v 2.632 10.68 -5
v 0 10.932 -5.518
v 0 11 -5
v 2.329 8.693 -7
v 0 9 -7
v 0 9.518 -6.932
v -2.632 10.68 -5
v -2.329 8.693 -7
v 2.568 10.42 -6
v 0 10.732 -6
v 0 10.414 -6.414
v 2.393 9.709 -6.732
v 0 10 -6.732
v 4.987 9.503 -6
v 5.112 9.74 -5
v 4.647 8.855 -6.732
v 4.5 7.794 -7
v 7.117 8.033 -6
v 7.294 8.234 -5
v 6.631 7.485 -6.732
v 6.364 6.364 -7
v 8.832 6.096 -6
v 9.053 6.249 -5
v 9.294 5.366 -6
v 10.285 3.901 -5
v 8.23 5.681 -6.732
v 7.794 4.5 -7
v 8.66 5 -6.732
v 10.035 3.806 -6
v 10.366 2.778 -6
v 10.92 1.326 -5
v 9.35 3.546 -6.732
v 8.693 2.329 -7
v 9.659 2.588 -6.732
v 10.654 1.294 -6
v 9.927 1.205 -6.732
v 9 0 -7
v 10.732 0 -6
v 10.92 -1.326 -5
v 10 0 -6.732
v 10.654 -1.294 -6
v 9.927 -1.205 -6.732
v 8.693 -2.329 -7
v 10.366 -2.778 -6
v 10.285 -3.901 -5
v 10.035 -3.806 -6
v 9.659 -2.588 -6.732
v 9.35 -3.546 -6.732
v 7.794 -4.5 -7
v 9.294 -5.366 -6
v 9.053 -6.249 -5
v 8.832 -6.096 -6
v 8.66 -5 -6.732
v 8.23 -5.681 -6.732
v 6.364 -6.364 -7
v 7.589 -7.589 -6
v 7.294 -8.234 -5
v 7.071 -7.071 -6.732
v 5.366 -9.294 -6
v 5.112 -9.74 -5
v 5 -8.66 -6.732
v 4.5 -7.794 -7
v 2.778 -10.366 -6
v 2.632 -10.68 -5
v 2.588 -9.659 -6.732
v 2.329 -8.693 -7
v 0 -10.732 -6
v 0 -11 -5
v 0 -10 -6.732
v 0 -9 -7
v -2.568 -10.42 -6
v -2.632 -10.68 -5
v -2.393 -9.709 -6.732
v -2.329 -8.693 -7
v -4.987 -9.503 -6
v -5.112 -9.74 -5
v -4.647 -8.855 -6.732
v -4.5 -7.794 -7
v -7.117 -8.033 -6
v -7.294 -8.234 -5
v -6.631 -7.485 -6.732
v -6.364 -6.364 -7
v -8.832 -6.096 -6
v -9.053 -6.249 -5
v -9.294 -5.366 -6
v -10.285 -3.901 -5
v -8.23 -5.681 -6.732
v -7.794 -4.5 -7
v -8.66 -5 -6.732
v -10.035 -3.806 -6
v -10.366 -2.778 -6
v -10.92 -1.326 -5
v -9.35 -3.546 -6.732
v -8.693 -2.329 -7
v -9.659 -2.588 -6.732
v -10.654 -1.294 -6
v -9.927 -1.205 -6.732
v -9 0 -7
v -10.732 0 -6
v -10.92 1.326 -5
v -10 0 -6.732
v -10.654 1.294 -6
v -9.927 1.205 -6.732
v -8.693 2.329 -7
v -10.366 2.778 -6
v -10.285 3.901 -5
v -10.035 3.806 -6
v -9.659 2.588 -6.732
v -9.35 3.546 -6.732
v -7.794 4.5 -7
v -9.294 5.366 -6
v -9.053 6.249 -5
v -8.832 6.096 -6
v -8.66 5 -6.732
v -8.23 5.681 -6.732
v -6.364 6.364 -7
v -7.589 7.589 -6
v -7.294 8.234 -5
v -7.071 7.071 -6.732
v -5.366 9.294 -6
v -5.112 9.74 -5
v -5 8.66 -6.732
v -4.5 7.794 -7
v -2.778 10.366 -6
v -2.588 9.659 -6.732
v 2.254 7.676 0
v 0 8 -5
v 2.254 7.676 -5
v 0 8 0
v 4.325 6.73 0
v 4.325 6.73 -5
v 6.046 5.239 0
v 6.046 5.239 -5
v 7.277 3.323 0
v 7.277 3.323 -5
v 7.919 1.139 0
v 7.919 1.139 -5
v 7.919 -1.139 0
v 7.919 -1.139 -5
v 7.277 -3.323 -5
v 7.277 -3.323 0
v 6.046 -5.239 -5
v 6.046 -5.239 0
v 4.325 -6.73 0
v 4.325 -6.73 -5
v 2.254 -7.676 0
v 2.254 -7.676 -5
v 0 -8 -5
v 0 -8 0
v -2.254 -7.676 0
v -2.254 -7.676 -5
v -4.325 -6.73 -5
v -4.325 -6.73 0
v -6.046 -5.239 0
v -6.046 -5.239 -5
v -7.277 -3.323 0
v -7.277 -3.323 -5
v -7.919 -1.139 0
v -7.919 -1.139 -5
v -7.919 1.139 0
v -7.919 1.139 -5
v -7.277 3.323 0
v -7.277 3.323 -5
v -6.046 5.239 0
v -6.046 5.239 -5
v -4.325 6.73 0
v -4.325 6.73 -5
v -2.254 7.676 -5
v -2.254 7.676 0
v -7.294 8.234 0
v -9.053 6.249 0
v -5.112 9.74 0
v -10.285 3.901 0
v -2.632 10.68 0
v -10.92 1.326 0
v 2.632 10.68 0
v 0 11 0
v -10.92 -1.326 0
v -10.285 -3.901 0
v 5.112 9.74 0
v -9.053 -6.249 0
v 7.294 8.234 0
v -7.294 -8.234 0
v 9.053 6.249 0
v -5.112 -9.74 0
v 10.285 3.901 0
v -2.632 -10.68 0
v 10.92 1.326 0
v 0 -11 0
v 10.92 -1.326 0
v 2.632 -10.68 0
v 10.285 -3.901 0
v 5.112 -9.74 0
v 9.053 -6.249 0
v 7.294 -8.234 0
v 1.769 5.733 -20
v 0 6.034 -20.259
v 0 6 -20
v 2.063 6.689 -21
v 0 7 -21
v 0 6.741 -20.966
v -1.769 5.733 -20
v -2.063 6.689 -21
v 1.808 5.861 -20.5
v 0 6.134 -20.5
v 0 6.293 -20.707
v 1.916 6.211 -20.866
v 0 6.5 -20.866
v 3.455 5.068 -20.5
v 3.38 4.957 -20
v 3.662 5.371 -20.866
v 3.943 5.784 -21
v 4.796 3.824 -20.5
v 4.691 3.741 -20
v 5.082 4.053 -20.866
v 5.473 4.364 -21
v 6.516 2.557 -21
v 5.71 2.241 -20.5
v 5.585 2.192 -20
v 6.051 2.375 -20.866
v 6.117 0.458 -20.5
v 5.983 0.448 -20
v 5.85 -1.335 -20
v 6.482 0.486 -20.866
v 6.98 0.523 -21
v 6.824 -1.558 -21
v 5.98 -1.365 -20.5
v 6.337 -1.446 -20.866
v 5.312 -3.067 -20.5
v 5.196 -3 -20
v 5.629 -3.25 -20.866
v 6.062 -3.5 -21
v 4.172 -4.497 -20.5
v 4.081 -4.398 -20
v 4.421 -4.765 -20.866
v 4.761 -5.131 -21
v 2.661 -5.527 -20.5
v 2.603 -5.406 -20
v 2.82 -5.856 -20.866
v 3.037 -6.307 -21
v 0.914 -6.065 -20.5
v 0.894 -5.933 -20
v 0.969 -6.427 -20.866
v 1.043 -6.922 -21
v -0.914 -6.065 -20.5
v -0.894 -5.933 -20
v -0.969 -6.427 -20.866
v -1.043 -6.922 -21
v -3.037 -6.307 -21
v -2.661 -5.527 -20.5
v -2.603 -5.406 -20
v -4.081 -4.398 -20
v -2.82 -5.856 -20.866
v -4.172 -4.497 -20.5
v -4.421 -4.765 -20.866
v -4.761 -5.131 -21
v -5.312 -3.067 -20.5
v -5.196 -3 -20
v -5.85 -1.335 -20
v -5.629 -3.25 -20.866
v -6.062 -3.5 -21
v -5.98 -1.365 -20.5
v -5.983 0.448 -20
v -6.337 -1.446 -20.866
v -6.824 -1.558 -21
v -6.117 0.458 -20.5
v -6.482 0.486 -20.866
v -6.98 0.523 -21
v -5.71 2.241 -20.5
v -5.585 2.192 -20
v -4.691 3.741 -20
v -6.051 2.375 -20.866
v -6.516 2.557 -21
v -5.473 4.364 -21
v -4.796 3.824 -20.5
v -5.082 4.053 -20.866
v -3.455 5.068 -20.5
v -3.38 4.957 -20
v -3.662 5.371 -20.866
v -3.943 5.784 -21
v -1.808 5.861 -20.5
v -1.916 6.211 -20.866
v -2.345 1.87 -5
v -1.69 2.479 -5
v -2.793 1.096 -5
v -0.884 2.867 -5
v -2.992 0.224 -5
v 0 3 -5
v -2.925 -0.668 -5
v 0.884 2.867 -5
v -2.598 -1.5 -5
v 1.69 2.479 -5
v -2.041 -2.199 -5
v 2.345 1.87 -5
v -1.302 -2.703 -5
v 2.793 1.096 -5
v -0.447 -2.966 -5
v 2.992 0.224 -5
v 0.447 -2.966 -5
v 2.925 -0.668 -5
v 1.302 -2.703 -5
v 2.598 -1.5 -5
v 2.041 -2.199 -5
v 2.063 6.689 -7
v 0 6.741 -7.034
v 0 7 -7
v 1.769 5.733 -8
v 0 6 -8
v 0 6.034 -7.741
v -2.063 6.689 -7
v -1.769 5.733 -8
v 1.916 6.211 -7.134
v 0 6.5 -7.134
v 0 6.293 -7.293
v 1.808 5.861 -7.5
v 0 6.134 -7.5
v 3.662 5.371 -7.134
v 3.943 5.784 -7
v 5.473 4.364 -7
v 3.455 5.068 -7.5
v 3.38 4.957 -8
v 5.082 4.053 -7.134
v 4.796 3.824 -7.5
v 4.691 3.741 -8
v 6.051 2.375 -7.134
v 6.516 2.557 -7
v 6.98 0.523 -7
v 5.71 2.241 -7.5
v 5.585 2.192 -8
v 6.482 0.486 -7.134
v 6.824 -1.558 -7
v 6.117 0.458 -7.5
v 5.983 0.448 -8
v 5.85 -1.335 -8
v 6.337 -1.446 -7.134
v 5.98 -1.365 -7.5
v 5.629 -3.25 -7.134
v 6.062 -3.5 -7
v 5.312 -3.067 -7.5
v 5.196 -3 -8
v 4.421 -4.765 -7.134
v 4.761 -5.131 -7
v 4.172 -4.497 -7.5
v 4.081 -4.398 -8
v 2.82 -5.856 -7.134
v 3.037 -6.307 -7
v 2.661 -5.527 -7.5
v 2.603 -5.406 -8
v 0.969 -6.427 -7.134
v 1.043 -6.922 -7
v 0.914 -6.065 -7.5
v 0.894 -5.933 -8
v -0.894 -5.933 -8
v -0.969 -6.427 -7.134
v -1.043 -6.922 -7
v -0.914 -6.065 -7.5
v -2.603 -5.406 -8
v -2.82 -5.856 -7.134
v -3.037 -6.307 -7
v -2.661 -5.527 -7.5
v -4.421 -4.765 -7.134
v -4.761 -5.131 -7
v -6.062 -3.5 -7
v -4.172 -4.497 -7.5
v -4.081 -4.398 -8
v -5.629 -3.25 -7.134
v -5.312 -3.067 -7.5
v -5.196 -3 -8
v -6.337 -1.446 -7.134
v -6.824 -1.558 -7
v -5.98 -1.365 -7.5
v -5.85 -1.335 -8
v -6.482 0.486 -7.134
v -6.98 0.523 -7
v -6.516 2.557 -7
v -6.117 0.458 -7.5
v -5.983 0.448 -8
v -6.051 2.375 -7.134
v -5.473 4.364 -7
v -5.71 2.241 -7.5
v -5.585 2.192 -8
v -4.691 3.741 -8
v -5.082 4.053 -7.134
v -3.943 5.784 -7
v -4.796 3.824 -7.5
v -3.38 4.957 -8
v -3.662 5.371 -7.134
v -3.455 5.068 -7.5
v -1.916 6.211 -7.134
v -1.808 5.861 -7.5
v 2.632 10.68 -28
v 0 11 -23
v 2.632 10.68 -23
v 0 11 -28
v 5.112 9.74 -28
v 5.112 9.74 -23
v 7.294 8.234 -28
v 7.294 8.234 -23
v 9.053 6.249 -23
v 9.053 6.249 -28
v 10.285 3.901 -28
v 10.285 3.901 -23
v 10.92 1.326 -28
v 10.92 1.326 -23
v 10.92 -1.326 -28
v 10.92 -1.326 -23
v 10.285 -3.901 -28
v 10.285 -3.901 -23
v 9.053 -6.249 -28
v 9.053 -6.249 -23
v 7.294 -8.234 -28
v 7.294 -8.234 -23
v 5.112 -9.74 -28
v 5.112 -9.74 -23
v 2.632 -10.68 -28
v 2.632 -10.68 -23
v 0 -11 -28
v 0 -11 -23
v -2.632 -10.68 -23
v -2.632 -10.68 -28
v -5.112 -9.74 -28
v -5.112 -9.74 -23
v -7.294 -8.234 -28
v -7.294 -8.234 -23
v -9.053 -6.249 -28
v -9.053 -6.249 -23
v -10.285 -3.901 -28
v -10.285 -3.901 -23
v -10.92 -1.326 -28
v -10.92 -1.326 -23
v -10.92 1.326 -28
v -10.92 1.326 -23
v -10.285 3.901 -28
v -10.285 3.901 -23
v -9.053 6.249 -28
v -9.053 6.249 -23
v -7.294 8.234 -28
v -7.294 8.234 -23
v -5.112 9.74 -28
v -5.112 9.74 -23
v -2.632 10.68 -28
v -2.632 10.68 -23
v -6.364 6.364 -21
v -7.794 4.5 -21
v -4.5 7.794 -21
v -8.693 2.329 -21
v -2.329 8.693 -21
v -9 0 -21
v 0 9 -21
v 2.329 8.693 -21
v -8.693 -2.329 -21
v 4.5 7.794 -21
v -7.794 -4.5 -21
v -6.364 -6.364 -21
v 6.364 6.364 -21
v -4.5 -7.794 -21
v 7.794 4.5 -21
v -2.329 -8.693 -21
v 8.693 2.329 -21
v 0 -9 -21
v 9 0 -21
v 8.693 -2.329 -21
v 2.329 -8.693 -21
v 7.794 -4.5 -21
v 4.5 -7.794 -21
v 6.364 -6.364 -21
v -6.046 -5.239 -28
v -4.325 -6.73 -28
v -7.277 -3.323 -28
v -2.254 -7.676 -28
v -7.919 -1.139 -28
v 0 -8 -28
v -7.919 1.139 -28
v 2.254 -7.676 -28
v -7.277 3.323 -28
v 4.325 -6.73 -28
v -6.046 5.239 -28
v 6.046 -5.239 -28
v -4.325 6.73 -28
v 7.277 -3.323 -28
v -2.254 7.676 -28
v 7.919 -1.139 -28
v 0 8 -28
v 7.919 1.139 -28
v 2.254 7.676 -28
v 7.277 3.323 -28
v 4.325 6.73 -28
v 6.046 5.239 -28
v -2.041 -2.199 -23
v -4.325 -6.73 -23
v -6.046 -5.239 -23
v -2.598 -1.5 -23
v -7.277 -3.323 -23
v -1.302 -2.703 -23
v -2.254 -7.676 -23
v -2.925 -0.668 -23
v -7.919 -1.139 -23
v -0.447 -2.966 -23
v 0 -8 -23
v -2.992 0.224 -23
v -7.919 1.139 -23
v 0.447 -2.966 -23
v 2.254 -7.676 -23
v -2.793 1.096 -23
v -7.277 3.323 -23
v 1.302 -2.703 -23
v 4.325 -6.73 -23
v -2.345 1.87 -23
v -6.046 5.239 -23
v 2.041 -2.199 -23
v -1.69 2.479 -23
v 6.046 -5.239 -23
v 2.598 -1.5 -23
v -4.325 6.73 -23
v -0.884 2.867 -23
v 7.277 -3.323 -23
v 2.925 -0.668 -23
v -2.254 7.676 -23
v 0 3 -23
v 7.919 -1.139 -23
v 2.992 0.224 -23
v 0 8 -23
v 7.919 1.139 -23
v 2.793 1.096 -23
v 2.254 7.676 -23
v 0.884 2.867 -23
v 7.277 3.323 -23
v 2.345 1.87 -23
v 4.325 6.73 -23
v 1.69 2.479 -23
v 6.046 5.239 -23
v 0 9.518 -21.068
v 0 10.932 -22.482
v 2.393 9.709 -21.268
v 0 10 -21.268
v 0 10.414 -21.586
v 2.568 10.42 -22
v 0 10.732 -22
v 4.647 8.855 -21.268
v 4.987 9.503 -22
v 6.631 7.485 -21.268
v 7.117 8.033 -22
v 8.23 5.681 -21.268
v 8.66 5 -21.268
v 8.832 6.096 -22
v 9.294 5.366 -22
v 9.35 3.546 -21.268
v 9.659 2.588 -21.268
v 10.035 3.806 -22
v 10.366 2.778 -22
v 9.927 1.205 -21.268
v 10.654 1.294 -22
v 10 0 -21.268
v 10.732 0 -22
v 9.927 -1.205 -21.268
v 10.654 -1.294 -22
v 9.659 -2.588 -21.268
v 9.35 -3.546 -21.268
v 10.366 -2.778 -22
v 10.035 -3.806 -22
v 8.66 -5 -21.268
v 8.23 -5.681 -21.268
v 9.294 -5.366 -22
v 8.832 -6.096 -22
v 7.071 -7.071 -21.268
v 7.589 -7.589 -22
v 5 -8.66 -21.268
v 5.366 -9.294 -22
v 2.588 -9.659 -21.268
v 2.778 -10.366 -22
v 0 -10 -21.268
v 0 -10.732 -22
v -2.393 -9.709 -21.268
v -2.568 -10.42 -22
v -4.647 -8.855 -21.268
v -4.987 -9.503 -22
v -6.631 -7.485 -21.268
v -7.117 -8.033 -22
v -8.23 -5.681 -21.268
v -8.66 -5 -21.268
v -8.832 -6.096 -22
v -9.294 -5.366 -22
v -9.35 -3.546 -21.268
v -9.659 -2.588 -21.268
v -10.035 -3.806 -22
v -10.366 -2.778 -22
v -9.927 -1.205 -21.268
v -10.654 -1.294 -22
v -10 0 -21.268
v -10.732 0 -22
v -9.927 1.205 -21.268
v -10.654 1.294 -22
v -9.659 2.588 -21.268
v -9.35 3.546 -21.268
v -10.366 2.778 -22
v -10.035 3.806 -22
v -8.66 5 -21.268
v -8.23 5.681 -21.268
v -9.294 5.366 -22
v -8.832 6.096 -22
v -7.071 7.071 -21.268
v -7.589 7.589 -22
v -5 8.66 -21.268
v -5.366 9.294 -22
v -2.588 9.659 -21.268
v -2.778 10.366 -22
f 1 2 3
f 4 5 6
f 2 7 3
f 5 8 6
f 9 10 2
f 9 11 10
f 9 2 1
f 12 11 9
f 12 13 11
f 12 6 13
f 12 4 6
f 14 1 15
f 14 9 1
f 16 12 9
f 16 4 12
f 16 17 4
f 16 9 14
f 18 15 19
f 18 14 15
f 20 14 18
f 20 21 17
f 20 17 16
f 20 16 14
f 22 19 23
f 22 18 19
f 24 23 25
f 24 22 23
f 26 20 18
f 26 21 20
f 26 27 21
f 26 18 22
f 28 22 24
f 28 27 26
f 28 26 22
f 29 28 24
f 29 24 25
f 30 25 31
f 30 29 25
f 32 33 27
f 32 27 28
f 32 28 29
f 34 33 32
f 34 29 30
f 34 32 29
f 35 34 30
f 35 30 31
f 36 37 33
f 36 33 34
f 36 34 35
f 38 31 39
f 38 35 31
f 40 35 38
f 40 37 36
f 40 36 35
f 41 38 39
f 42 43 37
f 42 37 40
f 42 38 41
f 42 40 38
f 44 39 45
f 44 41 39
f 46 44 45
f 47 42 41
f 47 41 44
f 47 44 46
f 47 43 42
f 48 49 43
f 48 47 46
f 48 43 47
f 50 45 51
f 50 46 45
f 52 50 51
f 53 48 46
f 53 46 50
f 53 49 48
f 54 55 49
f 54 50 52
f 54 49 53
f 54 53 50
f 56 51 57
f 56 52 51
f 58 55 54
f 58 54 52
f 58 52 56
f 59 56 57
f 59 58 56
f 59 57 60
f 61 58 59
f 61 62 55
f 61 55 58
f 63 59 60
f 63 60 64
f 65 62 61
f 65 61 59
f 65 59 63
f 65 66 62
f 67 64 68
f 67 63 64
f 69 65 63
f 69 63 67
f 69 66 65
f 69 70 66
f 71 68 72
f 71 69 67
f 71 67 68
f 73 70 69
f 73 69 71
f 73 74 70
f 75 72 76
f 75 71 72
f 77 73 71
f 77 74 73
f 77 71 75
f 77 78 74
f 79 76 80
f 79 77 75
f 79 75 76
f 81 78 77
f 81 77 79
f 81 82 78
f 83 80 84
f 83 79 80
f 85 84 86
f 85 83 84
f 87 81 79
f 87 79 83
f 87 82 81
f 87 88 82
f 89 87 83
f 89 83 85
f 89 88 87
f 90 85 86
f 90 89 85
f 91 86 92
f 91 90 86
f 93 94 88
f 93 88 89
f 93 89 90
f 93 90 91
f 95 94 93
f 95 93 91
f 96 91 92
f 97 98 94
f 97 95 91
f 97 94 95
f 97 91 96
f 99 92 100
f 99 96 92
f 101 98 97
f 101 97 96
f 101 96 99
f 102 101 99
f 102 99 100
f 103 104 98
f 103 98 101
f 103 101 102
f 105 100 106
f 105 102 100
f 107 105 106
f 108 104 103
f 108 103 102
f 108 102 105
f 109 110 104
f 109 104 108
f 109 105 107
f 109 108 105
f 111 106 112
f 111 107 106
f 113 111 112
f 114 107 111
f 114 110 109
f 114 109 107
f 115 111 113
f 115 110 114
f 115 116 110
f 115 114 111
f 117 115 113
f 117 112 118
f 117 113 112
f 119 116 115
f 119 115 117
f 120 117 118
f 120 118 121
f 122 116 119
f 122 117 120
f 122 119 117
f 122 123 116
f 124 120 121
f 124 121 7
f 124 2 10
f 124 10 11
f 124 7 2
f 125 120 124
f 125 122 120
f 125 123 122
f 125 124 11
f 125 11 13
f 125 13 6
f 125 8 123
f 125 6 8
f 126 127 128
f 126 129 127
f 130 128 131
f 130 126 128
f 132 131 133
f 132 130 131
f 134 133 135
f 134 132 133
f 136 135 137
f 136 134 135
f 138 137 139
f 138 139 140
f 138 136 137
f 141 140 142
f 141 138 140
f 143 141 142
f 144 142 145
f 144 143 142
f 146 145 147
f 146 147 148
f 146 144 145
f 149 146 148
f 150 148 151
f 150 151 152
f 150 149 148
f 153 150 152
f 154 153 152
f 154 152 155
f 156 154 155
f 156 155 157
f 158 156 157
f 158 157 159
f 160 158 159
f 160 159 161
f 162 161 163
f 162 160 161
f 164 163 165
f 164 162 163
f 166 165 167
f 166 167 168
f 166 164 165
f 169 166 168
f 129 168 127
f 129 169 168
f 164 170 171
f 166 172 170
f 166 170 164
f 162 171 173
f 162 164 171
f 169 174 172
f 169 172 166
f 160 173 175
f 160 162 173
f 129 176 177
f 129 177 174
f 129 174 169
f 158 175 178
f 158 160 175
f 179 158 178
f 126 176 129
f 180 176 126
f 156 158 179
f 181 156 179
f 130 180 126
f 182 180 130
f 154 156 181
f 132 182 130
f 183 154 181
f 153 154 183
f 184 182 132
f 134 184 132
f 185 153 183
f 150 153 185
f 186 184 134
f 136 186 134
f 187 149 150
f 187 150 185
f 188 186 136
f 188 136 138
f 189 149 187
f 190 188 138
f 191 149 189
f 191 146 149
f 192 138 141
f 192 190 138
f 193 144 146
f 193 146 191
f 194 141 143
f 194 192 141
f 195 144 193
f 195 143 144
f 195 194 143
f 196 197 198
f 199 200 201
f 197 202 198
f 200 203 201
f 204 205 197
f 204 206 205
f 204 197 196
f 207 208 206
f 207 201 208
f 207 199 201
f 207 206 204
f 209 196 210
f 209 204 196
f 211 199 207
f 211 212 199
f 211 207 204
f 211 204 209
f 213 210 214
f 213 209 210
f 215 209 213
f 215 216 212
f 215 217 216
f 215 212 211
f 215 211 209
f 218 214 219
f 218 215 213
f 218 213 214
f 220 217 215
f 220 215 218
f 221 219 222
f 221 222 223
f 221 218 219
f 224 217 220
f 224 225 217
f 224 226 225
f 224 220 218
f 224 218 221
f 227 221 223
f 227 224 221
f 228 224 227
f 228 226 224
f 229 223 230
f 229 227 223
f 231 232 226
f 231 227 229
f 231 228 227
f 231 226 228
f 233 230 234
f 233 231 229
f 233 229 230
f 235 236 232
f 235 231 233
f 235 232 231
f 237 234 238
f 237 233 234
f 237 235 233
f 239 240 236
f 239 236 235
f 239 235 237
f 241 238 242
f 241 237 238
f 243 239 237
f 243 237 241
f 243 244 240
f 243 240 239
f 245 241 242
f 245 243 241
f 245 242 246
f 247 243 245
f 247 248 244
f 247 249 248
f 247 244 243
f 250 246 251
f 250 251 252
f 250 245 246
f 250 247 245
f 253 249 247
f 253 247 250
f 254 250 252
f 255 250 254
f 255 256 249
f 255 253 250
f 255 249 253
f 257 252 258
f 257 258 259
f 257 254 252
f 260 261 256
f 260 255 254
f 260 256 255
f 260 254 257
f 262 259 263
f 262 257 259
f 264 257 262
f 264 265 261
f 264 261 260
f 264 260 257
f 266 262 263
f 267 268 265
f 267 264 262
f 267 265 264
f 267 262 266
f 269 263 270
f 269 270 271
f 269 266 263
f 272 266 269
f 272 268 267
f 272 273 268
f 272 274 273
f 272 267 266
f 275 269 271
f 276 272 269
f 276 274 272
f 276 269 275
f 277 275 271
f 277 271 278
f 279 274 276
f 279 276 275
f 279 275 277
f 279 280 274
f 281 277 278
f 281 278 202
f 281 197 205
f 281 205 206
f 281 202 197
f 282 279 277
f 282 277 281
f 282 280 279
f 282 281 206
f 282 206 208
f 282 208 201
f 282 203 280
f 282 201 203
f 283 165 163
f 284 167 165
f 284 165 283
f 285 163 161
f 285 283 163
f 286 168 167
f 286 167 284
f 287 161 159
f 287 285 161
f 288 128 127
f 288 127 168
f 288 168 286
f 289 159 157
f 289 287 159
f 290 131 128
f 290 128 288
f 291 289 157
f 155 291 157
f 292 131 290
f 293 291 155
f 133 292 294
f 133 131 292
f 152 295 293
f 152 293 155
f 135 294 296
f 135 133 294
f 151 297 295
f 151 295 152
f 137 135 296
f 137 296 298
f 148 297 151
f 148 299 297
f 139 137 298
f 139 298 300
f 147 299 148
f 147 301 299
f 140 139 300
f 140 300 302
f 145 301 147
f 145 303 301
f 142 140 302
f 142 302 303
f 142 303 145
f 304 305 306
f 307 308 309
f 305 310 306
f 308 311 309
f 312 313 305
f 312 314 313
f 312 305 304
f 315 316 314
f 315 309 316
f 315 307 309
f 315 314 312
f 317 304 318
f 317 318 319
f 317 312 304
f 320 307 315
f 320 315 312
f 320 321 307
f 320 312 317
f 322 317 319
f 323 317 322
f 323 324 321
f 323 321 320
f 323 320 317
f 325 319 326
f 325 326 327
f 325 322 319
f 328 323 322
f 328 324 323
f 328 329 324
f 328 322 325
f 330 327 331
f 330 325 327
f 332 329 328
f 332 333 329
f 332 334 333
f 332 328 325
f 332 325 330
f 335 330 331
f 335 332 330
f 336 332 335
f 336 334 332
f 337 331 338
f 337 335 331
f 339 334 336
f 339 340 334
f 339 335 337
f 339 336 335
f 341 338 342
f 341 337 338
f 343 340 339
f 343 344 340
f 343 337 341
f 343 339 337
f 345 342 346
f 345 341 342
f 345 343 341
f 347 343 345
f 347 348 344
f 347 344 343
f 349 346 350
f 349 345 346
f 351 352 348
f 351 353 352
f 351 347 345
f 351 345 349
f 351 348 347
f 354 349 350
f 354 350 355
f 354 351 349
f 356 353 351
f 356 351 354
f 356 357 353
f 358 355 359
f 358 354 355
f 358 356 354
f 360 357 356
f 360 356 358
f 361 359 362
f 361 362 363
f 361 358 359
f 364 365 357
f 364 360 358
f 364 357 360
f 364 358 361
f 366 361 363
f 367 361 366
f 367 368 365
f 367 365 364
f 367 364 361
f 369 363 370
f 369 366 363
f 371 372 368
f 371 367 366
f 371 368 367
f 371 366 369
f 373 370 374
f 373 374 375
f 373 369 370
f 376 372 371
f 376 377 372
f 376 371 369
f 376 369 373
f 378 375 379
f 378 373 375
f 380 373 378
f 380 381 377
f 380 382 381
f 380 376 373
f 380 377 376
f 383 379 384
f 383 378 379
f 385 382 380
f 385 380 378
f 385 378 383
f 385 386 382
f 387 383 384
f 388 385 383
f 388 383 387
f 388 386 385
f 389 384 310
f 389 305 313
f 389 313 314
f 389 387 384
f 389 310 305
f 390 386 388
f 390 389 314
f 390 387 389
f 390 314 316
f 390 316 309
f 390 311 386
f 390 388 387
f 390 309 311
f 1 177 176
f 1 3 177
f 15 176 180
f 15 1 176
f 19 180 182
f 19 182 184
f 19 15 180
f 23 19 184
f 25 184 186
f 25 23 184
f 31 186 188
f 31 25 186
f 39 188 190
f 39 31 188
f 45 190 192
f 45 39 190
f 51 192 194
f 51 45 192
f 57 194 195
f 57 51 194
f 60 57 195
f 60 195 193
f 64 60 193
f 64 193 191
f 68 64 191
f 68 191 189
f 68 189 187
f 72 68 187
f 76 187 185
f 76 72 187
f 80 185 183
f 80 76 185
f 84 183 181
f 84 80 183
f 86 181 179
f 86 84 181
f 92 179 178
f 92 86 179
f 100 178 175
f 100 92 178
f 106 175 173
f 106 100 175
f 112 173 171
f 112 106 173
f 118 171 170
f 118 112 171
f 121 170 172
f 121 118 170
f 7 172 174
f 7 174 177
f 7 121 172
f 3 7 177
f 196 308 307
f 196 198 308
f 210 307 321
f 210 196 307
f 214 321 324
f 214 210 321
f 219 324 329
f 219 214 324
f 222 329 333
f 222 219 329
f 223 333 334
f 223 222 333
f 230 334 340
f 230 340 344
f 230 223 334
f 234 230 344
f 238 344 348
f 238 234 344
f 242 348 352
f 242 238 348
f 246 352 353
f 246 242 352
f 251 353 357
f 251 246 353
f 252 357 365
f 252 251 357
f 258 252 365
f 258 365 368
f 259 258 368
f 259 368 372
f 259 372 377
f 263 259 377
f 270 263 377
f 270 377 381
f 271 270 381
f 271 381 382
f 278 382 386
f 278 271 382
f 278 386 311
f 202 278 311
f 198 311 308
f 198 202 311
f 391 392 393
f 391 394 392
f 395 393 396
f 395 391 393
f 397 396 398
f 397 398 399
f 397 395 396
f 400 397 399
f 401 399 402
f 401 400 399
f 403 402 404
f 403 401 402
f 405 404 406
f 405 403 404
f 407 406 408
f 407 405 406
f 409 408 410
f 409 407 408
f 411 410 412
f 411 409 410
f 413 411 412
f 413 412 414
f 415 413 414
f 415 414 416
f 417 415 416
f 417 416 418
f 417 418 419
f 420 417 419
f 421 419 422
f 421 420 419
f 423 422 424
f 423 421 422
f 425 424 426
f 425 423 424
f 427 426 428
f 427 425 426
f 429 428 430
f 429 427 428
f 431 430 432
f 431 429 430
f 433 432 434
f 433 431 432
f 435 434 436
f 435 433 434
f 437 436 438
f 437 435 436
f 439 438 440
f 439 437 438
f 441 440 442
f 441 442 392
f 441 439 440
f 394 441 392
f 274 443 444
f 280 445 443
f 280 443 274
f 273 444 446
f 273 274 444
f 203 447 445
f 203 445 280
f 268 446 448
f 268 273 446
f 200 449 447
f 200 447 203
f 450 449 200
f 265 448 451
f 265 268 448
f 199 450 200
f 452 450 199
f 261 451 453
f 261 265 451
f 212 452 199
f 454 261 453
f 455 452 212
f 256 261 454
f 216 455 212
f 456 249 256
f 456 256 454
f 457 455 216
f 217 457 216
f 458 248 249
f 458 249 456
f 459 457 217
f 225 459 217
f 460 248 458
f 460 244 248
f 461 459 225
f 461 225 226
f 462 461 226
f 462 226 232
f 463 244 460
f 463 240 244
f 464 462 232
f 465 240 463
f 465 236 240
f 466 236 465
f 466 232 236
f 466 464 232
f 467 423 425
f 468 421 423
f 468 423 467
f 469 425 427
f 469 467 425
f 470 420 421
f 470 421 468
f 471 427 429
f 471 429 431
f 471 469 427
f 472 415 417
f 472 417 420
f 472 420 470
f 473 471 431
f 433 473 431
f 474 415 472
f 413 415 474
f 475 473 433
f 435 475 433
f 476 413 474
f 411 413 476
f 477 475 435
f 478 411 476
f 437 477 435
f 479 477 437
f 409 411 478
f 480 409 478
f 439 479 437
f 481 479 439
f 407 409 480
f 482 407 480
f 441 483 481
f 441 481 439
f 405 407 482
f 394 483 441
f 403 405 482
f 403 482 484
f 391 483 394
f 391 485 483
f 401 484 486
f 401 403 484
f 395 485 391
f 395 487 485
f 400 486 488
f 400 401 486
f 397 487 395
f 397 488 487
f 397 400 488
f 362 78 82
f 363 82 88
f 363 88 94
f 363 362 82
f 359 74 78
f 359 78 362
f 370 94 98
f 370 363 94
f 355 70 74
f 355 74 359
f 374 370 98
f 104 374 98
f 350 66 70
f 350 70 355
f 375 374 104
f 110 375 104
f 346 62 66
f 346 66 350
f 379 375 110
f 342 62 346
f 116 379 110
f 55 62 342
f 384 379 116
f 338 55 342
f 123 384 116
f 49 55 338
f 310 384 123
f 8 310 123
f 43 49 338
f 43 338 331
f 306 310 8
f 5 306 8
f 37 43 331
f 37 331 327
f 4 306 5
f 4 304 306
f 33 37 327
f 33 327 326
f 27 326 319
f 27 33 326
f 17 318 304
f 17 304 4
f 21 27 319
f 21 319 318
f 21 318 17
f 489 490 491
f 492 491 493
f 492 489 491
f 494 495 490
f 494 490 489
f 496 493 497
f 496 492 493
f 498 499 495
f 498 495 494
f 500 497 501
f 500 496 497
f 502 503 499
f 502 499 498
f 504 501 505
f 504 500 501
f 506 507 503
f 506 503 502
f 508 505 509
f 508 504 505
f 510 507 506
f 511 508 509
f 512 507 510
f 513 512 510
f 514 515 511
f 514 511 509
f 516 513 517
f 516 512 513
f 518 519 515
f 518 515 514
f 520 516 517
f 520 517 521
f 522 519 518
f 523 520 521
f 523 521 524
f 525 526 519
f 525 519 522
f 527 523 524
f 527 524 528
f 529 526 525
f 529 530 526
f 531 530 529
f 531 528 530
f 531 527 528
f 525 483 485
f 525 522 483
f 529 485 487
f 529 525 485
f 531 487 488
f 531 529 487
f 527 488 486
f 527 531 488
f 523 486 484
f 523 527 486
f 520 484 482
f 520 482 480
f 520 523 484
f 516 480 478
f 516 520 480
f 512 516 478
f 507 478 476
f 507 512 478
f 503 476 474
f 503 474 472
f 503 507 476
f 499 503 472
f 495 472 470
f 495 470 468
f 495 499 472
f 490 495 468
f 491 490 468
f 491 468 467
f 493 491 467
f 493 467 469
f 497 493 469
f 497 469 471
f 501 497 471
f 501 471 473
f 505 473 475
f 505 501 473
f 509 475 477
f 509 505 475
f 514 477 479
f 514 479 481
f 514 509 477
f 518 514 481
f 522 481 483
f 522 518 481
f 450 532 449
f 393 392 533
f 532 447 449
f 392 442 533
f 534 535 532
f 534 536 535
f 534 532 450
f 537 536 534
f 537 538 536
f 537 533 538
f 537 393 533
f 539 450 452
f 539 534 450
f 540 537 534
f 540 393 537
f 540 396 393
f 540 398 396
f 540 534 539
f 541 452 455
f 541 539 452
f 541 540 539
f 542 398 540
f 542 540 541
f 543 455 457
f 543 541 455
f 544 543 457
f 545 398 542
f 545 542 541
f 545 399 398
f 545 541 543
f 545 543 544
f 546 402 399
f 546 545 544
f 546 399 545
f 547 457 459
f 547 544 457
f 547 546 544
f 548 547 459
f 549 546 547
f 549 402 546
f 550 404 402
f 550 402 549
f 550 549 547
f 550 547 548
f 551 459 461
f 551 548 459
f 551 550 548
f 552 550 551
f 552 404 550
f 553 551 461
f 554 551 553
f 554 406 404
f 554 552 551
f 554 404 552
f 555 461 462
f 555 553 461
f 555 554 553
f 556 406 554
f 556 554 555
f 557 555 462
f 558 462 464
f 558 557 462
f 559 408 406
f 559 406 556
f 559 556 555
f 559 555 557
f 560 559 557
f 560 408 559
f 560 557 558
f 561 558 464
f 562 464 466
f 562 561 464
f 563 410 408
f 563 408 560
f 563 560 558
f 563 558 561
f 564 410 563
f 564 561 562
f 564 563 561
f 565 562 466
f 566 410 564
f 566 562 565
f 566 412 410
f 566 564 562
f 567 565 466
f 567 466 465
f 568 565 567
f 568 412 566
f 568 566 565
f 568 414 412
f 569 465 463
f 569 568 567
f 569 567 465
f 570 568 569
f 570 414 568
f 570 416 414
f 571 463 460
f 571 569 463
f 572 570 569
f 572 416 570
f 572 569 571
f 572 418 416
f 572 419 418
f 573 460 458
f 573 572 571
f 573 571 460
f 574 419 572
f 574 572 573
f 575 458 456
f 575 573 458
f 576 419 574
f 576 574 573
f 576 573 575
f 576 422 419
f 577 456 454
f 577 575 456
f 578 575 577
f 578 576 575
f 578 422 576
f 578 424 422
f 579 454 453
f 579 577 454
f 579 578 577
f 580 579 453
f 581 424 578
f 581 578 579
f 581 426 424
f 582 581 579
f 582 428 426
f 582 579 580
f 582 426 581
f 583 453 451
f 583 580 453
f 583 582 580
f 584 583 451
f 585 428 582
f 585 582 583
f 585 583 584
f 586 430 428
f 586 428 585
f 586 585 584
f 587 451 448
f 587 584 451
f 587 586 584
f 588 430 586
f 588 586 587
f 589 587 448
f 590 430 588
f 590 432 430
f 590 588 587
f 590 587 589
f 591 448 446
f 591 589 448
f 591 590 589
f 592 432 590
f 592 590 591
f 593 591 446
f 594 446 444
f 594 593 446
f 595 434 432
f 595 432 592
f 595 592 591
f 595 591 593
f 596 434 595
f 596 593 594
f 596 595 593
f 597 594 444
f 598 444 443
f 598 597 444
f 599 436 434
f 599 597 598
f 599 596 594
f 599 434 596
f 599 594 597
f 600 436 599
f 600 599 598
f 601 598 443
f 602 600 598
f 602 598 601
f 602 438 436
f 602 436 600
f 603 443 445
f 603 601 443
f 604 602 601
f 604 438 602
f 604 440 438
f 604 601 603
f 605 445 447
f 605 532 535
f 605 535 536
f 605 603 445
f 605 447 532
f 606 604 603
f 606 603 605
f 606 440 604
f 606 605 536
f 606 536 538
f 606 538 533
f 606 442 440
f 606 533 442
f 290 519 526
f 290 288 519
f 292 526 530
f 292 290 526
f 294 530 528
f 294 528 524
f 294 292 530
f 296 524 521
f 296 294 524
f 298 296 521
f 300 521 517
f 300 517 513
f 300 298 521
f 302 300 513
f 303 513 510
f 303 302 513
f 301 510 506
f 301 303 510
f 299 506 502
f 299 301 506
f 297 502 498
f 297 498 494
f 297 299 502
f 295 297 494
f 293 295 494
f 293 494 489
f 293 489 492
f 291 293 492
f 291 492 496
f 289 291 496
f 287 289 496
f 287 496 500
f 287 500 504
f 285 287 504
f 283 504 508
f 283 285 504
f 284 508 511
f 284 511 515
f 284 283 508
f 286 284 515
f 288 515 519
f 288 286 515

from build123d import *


with BuildPart() as part:
    # Esboço1 → Revolução1 (revolve)
    with BuildSketch(Plane(origin=(0, 0, 0), x_dir=(0, 0, -1), z_dir=(1, 0, 0))):
        with BuildLine():
            Line((0, 8), (0, 11))
            Line((0, 11), (5, 11))
            ThreePointArc((5, 11), (6.414213562, 10.414213562), (7, 9))
            Line((7, 9), (7, 7))
            ThreePointArc((7, 7), (7.292893219, 6.292893219), (8, 6))
            Line((8, 6), (20, 6))
            ThreePointArc((20, 6), (20.707106781, 6.292893219), (21, 7))
            Line((21, 7), (21, 9))
            ThreePointArc((21, 9), (21.585786438, 10.414213562), (23, 11))
            Line((23, 11), (28, 11))
            Line((28, 11), (28, 8))
            Line((28, 8), (23, 8))
            Line((23, 8), (23, 3))
            Line((23, 3), (5, 3))
            Line((5, 3), (5, 8))
            Line((5, 8), (0, 8))
        make_face()
    revolve(axis=Axis((0, 0, 0), (0, 0, -1)))


solid = part.part
